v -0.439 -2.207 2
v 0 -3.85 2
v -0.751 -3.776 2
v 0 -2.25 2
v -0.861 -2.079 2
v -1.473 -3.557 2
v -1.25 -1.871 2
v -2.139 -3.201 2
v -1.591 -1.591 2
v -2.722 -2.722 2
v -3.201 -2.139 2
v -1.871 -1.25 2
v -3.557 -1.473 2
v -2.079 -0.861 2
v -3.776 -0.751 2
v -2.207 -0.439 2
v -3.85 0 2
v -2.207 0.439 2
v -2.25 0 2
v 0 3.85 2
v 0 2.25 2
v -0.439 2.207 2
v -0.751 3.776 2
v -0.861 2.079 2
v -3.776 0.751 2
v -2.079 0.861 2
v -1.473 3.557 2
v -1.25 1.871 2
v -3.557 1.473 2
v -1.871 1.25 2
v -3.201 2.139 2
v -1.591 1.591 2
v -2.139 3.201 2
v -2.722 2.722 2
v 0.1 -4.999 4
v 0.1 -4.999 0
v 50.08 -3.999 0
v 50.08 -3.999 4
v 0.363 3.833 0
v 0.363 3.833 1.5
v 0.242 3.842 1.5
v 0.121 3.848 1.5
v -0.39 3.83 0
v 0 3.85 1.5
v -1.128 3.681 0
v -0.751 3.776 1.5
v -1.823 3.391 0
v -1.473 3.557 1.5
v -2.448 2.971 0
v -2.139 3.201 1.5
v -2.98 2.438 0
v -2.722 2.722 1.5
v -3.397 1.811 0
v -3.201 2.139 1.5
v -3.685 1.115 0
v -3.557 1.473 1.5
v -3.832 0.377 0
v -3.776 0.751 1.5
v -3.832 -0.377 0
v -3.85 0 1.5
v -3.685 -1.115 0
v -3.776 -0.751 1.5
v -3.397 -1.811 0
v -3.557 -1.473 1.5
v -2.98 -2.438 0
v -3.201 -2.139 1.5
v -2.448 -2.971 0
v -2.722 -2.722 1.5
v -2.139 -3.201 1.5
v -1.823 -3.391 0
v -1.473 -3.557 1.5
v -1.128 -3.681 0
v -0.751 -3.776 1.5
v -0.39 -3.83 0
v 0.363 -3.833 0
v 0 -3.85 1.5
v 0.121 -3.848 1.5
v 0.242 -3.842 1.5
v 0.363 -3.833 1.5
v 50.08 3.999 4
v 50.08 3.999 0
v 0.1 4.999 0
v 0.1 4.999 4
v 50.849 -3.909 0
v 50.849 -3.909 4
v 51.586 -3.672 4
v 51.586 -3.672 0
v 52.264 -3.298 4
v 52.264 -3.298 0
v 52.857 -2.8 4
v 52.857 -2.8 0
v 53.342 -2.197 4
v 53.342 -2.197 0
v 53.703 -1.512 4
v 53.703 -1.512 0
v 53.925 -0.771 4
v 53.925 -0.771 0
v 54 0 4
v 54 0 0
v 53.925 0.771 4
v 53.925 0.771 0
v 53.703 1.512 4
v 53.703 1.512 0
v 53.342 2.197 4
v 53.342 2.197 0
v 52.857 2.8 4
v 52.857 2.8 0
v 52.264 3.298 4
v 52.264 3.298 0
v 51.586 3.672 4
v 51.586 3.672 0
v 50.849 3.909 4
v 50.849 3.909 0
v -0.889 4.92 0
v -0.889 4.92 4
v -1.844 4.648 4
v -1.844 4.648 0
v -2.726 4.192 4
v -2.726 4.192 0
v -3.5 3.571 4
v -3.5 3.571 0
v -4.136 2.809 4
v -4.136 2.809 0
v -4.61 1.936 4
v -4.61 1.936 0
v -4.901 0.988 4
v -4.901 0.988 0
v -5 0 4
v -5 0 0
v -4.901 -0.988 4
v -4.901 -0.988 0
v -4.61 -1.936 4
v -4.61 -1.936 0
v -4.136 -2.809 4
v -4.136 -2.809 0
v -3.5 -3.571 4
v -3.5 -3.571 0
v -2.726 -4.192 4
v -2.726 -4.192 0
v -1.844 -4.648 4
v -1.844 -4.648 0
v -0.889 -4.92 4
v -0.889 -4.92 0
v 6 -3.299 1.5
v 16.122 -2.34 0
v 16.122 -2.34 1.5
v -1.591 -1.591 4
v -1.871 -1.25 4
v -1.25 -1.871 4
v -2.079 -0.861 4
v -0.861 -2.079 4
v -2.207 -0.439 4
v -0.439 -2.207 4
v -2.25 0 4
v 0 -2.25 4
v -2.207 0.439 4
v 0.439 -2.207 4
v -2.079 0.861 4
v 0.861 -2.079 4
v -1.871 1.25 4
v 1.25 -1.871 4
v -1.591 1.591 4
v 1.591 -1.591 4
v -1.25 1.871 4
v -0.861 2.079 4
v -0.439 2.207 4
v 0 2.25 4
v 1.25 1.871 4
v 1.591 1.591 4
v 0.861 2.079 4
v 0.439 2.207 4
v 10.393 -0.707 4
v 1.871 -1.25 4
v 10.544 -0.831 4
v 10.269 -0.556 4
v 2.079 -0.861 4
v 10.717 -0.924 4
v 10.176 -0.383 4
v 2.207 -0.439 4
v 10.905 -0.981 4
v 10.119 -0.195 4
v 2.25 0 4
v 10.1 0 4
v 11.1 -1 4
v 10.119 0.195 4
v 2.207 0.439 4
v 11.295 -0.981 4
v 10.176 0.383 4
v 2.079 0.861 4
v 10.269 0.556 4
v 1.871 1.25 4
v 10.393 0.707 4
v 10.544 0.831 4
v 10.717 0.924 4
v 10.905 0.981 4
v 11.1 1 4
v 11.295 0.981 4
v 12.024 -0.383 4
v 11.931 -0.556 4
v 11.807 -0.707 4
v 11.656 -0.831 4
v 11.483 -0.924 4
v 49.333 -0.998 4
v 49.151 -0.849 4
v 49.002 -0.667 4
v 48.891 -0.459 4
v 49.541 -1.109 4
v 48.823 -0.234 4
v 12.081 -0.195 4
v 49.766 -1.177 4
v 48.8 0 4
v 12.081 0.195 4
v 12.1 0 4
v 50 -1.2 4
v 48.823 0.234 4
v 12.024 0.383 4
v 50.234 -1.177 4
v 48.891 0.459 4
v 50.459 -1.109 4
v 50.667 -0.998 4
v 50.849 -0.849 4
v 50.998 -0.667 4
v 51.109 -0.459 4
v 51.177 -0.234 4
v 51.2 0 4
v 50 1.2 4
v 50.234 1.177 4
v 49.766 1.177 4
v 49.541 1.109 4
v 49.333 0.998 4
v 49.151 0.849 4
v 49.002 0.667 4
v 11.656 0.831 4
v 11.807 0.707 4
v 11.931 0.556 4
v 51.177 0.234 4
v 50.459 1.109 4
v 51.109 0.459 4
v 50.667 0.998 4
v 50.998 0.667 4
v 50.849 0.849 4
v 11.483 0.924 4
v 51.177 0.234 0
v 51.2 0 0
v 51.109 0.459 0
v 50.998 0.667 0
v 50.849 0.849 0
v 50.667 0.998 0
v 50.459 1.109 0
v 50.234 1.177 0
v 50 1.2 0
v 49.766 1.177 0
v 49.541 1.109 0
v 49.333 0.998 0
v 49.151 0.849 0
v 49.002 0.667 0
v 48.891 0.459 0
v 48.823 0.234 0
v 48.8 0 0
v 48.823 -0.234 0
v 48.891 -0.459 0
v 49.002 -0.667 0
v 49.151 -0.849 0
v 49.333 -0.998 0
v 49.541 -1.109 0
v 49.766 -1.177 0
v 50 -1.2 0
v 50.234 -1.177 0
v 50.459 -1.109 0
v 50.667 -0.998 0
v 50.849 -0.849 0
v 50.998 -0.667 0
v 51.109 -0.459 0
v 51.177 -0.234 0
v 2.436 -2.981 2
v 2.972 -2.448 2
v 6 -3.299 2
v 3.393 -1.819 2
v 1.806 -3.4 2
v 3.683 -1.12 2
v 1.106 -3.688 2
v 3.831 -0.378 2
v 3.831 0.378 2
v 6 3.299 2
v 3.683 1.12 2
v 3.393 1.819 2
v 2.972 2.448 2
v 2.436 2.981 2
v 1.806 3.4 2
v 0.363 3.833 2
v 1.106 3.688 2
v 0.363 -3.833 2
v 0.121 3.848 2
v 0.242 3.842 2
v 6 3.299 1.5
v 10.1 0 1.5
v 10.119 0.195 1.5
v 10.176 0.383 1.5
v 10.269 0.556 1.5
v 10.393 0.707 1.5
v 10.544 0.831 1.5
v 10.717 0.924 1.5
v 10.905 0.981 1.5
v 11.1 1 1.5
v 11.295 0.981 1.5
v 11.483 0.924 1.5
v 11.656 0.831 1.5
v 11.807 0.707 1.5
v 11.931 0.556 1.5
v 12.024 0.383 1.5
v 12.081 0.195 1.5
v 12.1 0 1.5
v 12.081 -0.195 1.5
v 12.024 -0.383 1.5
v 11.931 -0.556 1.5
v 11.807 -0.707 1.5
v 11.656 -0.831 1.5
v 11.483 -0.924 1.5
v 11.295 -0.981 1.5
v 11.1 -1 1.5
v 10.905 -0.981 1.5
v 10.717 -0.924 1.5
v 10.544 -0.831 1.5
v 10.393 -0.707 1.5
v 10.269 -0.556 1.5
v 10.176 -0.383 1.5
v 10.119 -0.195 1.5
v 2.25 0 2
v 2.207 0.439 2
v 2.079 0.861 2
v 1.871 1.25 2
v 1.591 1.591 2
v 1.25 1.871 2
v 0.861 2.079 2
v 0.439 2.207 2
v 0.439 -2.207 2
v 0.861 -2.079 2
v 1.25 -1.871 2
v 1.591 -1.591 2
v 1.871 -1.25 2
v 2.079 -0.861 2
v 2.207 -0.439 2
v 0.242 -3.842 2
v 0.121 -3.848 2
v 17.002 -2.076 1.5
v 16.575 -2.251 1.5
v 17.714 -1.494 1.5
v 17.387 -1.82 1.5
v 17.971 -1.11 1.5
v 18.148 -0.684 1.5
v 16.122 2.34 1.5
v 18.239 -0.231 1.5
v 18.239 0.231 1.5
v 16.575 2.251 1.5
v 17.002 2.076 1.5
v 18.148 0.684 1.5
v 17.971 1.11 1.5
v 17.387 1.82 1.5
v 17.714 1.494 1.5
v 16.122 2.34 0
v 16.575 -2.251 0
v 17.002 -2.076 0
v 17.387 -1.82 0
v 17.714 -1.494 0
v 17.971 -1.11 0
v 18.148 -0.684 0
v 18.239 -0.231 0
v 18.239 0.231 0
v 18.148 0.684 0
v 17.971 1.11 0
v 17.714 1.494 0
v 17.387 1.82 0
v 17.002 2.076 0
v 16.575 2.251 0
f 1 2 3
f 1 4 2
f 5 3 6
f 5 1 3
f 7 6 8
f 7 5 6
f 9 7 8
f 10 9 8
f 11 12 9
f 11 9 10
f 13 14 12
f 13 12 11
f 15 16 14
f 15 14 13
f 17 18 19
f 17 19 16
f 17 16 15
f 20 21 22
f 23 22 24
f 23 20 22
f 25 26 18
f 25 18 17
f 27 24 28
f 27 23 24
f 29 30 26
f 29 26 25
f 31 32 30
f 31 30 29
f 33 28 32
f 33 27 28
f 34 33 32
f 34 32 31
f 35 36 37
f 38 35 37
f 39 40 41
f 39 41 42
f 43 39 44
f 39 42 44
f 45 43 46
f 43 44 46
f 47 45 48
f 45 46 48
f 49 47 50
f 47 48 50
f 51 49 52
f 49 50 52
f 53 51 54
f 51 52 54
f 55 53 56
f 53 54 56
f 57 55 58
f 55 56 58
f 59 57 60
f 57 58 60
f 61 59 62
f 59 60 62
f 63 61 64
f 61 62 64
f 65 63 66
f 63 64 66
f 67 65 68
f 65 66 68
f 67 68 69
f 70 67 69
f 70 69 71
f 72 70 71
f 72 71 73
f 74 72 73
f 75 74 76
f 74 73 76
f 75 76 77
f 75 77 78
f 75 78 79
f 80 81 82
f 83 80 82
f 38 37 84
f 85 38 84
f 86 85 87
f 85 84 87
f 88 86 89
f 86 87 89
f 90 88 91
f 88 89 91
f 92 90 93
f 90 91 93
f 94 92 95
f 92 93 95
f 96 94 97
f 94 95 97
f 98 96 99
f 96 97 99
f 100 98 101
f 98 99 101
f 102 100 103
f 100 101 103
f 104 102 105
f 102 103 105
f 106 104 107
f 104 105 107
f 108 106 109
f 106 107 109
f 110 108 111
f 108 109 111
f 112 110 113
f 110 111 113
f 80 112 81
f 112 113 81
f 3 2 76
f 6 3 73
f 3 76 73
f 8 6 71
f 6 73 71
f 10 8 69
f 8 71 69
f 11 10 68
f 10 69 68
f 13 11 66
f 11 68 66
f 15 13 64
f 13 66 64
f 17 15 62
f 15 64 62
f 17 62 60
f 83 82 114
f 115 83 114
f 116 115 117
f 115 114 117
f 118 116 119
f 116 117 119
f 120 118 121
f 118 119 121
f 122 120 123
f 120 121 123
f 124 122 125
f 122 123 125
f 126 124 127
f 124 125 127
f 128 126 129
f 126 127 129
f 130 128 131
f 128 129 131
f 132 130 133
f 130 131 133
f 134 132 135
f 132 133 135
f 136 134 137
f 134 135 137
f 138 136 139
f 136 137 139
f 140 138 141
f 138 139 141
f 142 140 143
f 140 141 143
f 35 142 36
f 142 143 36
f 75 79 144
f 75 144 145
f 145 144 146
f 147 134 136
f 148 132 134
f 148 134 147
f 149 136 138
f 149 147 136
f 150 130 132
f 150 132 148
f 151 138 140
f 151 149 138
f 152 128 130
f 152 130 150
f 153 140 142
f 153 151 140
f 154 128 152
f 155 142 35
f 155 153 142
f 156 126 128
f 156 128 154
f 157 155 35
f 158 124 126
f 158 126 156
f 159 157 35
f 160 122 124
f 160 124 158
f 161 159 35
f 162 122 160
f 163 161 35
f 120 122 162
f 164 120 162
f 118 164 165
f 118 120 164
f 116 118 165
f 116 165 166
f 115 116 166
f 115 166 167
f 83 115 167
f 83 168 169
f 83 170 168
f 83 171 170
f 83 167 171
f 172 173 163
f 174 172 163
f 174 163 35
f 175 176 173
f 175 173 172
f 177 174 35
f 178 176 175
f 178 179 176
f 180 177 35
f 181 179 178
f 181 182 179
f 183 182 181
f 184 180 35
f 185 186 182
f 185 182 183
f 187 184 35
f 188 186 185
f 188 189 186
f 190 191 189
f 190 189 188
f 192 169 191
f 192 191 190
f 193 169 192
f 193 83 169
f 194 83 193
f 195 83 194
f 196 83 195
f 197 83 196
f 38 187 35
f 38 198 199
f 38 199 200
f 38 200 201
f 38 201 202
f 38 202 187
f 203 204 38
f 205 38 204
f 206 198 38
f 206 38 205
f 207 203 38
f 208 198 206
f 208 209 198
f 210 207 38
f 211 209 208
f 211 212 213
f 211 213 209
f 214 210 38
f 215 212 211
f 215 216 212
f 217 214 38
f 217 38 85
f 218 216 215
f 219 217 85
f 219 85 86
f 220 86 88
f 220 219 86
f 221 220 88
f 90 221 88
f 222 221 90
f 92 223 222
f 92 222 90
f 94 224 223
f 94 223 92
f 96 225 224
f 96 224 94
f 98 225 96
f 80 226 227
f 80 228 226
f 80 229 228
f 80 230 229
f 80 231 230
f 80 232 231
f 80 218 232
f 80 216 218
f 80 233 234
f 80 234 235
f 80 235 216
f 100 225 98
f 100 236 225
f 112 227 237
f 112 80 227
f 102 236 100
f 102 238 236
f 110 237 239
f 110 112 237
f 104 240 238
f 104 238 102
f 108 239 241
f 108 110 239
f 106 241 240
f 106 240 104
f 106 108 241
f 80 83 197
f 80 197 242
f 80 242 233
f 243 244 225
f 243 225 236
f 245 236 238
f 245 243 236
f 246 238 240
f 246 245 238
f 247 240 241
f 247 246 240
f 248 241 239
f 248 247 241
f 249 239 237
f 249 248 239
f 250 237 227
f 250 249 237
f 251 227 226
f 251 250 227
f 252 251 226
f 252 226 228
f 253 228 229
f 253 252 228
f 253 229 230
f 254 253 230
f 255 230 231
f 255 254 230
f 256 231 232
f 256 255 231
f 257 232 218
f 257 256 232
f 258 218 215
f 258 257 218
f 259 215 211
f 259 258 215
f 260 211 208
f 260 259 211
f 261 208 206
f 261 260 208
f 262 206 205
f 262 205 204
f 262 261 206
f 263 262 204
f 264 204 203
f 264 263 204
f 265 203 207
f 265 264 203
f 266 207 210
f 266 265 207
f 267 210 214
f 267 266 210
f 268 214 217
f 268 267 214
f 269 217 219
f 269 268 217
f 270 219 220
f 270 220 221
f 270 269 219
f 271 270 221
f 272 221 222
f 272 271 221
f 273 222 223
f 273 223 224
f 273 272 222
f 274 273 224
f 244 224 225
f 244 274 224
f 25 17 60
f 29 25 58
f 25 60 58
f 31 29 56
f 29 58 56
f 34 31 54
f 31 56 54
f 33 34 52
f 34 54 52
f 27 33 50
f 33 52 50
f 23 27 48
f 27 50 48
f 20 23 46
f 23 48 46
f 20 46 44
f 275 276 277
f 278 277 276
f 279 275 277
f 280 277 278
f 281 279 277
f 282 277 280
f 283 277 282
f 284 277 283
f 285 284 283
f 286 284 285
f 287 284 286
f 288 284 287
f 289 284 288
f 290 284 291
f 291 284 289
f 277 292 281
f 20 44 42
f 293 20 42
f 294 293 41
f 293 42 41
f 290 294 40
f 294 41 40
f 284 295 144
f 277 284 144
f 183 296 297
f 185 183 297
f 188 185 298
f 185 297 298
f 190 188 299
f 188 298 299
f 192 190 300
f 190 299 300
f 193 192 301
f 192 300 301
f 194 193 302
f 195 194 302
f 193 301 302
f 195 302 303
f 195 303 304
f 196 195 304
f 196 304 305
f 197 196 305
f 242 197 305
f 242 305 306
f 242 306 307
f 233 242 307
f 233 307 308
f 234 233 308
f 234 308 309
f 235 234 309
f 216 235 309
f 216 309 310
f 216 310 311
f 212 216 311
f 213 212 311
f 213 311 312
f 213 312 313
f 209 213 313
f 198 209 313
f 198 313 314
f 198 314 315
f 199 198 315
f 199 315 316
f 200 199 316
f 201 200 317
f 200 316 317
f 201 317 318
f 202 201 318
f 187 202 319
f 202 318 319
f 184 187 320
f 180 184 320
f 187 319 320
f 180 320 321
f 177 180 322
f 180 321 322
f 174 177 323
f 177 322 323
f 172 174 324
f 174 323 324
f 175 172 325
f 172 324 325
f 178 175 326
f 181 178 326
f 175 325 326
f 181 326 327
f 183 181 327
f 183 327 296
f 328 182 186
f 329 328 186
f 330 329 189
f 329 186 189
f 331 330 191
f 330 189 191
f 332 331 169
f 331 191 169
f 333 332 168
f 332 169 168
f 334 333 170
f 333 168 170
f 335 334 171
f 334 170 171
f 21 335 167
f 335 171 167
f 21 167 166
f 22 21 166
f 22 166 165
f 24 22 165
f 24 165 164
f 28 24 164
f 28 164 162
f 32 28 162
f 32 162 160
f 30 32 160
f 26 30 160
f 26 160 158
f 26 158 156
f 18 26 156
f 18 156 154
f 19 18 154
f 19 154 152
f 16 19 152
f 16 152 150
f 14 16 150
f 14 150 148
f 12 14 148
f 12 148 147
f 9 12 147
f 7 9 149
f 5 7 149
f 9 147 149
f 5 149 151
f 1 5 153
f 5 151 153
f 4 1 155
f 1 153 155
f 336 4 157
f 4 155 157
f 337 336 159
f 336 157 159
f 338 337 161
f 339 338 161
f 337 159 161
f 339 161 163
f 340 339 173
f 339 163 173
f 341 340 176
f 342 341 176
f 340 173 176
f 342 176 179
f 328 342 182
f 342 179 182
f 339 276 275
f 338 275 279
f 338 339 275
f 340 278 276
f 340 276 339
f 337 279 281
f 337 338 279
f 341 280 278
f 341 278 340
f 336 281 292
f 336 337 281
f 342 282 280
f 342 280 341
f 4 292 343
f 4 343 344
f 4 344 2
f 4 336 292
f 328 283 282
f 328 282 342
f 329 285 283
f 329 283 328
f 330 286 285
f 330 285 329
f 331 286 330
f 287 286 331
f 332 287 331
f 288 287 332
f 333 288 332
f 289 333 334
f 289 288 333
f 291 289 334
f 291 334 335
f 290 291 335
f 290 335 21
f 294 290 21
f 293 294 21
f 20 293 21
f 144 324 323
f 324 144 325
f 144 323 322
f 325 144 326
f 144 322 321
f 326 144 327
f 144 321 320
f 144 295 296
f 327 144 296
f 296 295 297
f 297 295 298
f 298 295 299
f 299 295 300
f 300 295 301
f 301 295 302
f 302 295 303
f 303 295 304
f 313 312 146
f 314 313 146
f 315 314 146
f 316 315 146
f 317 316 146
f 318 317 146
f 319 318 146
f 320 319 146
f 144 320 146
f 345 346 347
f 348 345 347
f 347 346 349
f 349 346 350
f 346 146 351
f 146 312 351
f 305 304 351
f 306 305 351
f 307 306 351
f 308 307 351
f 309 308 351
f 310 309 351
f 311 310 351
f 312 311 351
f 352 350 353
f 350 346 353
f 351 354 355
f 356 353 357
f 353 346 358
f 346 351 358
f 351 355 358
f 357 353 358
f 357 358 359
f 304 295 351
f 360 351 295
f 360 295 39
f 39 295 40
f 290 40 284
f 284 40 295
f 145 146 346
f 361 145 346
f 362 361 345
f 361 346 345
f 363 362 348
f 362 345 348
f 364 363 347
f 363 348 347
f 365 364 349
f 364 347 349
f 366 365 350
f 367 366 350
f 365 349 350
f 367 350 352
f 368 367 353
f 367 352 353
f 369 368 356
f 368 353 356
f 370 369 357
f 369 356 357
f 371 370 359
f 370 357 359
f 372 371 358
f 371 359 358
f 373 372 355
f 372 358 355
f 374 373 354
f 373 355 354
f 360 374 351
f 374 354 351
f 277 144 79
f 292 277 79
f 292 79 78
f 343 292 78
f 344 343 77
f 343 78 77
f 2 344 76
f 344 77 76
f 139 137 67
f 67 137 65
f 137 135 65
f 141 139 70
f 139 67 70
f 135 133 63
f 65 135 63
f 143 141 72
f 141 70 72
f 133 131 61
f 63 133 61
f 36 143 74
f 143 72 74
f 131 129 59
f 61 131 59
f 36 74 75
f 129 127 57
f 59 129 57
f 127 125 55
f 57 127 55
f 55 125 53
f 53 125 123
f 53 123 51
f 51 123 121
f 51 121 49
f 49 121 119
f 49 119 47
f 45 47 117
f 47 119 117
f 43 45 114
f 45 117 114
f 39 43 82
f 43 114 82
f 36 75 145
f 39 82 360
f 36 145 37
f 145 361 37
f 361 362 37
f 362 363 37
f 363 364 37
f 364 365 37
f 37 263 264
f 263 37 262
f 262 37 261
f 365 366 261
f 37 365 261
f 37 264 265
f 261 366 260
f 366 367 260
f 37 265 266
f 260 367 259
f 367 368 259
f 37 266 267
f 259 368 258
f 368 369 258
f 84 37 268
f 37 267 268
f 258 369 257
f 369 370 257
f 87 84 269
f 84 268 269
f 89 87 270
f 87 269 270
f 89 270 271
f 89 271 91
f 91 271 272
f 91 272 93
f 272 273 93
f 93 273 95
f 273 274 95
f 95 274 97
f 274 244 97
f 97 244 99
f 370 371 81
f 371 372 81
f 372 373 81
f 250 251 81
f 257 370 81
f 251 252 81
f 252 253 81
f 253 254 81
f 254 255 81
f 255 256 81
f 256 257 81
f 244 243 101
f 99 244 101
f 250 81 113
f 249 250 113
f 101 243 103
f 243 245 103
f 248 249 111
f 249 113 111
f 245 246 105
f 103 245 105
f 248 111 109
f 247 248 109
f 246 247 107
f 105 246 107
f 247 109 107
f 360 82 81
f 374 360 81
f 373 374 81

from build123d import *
from build123d.topology import SkipClean

# Parameters (mm, degrees)
SKETCH14_R          = 4
SKETCH14_R_2        = 1.2
SKETCH14_R_3        = 5
BOSS_EXTRUDE1_DEPTH = 4
CUT_EXTRUDE1_START  = -2.5
SKETCH15_R          = 1.2
CUT_EXTRUDE1_DEPTH  = 1.5
CUT_EXTRUDE2_DEPTH  = 0.5
SKETCH17_R          = 1
CUT_EXTRUDE3_DEPTH  = 6
SKETCH18_R          = 2.25
CUT_EXTRUDE4_DEPTH  = 10


with BuildPart() as part:
    # Sketch14 → Boss-Extrude1 (new body)
    with BuildSketch(Plane.XY):
        with BuildLine():
            Line((50.08, 3.99919992), (0.1, 4.9989999))
            ThreePointArc((0.1, 4.9989999), (3.570714214, 3.5), (5, 0))
            ThreePointArc((5, 0), (3.570714214, -3.5), (0.1, -4.9989999))
            Line((0.1, -4.9989999), (50.08, -3.99919992))
            ThreePointArc((50.08, -3.99919992), (46, 0), (50.08, 3.99919992))
        make_face()
        with Locations((50, 0)):
            Circle(SKETCH14_R)
        with Locations((50, 0)):
            Circle(SKETCH14_R_2, mode=Mode.SUBTRACT)
        Circle(SKETCH14_R_3)
        Circle(SKETCH14_R_2, mode=Mode.SUBTRACT)
    extrude(amount=BOSS_EXTRUDE1_DEPTH)

    # Sketch15 → Cut-Extrude1 (cut)
    with BuildSketch(Plane.XY.offset(4).offset(CUT_EXTRUDE1_START)):
        with BuildLine():
            Line((16.121698113, 2.33951917), (0.363207547, 3.832829278))
            ThreePointArc((0.363207547, 3.832829278), (-3.85, 0), (0.363207547, -3.832829278))
            Line((0.363207547, -3.832829278), (16.121698113, -2.33951917))
            ThreePointArc((16.121698113, -2.33951917), (18.25, 0), (16.121698113, 2.33951917))
        make_face()
        Circle(SKETCH15_R, mode=Mode.SUBTRACT)
    extrude(amount=-CUT_EXTRUDE1_DEPTH, mode=Mode.SUBTRACT)

    # Sketch16 → Cut-Extrude2 (cut)
    with SkipClean():  # the faces are left unmerged after this step: merging them gives an invalid solid
        with BuildSketch(Plane(origin=(0, 0, 1.5), x_dir=(-1, 0, 0), z_dir=(0, 0, -1))):
            with BuildLine():
                ThreePointArc((-0.363207547, -3.832829278), (-3.85, 0), (-0.363207547, 3.832829278))
                Line((-0.363207547, 3.832829278), (-6, 3.298674112))
                Line((-6, 3.298674112), (-6, -3.298674112))
                Line((-6, -3.298674112), (-0.363207547, -3.832829278))
            make_face()
            with BuildLine():
                ThreePointArc((3.85, 0), (2.722361108, 2.722361108), (0, 3.85))
                Line((0, 3.85), (0, 1.2))
                ThreePointArc((0, 1.2), (0.848528137, 0.848528137), (1.2, 0))
                ThreePointArc((1.2, 0), (0.848528137, -0.848528137), (0, -1.2))
                Line((0, -1.2), (0, -3.85))
                ThreePointArc((0, -3.85), (2.722361108, -2.722361108), (3.85, 0))
            make_face()
            with BuildLine():
                Line((0, 1.2), (0, 3.85))
                ThreePointArc((0, 3.85), (-0.181806598, 3.845704924), (-0.363207547, 3.832829278))
                ThreePointArc((-0.363207547, 3.832829278), (-3.85, 0), (-0.363207547, -3.832829278))
                ThreePointArc((-0.363207547, -3.832829278), (-0.181806598, -3.845704924), (0, -3.85))
                Line((0, -3.85), (0, -1.2))
                ThreePointArc((0, -1.2), (-1.2, 0), (0, 1.2))
            make_face()
        extrude(amount=-CUT_EXTRUDE2_DEPTH, mode=Mode.SUBTRACT)

    # Sketch17 → Cut-Extrude3 (cut)
    with SkipClean():  # the faces are left unmerged after this step: merging them gives an invalid solid
        with BuildSketch(Plane(origin=(0, 0, 1.5), x_dir=(-1, 0, 0), z_dir=(0, 0, -1))):
            with Locations((-11.1, 0)):
                Circle(SKETCH17_R)
        extrude(amount=-CUT_EXTRUDE3_DEPTH, mode=Mode.SUBTRACT)

    # Sketch18 → Cut-Extrude4 (cut)
    with SkipClean():  # the faces are left unmerged after this step: merging them gives an invalid solid
        with BuildSketch(Plane.XY.offset(4)):
            Circle(SKETCH18_R)
        extrude(amount=-CUT_EXTRUDE4_DEPTH, mode=Mode.SUBTRACT)


solid = part.part
